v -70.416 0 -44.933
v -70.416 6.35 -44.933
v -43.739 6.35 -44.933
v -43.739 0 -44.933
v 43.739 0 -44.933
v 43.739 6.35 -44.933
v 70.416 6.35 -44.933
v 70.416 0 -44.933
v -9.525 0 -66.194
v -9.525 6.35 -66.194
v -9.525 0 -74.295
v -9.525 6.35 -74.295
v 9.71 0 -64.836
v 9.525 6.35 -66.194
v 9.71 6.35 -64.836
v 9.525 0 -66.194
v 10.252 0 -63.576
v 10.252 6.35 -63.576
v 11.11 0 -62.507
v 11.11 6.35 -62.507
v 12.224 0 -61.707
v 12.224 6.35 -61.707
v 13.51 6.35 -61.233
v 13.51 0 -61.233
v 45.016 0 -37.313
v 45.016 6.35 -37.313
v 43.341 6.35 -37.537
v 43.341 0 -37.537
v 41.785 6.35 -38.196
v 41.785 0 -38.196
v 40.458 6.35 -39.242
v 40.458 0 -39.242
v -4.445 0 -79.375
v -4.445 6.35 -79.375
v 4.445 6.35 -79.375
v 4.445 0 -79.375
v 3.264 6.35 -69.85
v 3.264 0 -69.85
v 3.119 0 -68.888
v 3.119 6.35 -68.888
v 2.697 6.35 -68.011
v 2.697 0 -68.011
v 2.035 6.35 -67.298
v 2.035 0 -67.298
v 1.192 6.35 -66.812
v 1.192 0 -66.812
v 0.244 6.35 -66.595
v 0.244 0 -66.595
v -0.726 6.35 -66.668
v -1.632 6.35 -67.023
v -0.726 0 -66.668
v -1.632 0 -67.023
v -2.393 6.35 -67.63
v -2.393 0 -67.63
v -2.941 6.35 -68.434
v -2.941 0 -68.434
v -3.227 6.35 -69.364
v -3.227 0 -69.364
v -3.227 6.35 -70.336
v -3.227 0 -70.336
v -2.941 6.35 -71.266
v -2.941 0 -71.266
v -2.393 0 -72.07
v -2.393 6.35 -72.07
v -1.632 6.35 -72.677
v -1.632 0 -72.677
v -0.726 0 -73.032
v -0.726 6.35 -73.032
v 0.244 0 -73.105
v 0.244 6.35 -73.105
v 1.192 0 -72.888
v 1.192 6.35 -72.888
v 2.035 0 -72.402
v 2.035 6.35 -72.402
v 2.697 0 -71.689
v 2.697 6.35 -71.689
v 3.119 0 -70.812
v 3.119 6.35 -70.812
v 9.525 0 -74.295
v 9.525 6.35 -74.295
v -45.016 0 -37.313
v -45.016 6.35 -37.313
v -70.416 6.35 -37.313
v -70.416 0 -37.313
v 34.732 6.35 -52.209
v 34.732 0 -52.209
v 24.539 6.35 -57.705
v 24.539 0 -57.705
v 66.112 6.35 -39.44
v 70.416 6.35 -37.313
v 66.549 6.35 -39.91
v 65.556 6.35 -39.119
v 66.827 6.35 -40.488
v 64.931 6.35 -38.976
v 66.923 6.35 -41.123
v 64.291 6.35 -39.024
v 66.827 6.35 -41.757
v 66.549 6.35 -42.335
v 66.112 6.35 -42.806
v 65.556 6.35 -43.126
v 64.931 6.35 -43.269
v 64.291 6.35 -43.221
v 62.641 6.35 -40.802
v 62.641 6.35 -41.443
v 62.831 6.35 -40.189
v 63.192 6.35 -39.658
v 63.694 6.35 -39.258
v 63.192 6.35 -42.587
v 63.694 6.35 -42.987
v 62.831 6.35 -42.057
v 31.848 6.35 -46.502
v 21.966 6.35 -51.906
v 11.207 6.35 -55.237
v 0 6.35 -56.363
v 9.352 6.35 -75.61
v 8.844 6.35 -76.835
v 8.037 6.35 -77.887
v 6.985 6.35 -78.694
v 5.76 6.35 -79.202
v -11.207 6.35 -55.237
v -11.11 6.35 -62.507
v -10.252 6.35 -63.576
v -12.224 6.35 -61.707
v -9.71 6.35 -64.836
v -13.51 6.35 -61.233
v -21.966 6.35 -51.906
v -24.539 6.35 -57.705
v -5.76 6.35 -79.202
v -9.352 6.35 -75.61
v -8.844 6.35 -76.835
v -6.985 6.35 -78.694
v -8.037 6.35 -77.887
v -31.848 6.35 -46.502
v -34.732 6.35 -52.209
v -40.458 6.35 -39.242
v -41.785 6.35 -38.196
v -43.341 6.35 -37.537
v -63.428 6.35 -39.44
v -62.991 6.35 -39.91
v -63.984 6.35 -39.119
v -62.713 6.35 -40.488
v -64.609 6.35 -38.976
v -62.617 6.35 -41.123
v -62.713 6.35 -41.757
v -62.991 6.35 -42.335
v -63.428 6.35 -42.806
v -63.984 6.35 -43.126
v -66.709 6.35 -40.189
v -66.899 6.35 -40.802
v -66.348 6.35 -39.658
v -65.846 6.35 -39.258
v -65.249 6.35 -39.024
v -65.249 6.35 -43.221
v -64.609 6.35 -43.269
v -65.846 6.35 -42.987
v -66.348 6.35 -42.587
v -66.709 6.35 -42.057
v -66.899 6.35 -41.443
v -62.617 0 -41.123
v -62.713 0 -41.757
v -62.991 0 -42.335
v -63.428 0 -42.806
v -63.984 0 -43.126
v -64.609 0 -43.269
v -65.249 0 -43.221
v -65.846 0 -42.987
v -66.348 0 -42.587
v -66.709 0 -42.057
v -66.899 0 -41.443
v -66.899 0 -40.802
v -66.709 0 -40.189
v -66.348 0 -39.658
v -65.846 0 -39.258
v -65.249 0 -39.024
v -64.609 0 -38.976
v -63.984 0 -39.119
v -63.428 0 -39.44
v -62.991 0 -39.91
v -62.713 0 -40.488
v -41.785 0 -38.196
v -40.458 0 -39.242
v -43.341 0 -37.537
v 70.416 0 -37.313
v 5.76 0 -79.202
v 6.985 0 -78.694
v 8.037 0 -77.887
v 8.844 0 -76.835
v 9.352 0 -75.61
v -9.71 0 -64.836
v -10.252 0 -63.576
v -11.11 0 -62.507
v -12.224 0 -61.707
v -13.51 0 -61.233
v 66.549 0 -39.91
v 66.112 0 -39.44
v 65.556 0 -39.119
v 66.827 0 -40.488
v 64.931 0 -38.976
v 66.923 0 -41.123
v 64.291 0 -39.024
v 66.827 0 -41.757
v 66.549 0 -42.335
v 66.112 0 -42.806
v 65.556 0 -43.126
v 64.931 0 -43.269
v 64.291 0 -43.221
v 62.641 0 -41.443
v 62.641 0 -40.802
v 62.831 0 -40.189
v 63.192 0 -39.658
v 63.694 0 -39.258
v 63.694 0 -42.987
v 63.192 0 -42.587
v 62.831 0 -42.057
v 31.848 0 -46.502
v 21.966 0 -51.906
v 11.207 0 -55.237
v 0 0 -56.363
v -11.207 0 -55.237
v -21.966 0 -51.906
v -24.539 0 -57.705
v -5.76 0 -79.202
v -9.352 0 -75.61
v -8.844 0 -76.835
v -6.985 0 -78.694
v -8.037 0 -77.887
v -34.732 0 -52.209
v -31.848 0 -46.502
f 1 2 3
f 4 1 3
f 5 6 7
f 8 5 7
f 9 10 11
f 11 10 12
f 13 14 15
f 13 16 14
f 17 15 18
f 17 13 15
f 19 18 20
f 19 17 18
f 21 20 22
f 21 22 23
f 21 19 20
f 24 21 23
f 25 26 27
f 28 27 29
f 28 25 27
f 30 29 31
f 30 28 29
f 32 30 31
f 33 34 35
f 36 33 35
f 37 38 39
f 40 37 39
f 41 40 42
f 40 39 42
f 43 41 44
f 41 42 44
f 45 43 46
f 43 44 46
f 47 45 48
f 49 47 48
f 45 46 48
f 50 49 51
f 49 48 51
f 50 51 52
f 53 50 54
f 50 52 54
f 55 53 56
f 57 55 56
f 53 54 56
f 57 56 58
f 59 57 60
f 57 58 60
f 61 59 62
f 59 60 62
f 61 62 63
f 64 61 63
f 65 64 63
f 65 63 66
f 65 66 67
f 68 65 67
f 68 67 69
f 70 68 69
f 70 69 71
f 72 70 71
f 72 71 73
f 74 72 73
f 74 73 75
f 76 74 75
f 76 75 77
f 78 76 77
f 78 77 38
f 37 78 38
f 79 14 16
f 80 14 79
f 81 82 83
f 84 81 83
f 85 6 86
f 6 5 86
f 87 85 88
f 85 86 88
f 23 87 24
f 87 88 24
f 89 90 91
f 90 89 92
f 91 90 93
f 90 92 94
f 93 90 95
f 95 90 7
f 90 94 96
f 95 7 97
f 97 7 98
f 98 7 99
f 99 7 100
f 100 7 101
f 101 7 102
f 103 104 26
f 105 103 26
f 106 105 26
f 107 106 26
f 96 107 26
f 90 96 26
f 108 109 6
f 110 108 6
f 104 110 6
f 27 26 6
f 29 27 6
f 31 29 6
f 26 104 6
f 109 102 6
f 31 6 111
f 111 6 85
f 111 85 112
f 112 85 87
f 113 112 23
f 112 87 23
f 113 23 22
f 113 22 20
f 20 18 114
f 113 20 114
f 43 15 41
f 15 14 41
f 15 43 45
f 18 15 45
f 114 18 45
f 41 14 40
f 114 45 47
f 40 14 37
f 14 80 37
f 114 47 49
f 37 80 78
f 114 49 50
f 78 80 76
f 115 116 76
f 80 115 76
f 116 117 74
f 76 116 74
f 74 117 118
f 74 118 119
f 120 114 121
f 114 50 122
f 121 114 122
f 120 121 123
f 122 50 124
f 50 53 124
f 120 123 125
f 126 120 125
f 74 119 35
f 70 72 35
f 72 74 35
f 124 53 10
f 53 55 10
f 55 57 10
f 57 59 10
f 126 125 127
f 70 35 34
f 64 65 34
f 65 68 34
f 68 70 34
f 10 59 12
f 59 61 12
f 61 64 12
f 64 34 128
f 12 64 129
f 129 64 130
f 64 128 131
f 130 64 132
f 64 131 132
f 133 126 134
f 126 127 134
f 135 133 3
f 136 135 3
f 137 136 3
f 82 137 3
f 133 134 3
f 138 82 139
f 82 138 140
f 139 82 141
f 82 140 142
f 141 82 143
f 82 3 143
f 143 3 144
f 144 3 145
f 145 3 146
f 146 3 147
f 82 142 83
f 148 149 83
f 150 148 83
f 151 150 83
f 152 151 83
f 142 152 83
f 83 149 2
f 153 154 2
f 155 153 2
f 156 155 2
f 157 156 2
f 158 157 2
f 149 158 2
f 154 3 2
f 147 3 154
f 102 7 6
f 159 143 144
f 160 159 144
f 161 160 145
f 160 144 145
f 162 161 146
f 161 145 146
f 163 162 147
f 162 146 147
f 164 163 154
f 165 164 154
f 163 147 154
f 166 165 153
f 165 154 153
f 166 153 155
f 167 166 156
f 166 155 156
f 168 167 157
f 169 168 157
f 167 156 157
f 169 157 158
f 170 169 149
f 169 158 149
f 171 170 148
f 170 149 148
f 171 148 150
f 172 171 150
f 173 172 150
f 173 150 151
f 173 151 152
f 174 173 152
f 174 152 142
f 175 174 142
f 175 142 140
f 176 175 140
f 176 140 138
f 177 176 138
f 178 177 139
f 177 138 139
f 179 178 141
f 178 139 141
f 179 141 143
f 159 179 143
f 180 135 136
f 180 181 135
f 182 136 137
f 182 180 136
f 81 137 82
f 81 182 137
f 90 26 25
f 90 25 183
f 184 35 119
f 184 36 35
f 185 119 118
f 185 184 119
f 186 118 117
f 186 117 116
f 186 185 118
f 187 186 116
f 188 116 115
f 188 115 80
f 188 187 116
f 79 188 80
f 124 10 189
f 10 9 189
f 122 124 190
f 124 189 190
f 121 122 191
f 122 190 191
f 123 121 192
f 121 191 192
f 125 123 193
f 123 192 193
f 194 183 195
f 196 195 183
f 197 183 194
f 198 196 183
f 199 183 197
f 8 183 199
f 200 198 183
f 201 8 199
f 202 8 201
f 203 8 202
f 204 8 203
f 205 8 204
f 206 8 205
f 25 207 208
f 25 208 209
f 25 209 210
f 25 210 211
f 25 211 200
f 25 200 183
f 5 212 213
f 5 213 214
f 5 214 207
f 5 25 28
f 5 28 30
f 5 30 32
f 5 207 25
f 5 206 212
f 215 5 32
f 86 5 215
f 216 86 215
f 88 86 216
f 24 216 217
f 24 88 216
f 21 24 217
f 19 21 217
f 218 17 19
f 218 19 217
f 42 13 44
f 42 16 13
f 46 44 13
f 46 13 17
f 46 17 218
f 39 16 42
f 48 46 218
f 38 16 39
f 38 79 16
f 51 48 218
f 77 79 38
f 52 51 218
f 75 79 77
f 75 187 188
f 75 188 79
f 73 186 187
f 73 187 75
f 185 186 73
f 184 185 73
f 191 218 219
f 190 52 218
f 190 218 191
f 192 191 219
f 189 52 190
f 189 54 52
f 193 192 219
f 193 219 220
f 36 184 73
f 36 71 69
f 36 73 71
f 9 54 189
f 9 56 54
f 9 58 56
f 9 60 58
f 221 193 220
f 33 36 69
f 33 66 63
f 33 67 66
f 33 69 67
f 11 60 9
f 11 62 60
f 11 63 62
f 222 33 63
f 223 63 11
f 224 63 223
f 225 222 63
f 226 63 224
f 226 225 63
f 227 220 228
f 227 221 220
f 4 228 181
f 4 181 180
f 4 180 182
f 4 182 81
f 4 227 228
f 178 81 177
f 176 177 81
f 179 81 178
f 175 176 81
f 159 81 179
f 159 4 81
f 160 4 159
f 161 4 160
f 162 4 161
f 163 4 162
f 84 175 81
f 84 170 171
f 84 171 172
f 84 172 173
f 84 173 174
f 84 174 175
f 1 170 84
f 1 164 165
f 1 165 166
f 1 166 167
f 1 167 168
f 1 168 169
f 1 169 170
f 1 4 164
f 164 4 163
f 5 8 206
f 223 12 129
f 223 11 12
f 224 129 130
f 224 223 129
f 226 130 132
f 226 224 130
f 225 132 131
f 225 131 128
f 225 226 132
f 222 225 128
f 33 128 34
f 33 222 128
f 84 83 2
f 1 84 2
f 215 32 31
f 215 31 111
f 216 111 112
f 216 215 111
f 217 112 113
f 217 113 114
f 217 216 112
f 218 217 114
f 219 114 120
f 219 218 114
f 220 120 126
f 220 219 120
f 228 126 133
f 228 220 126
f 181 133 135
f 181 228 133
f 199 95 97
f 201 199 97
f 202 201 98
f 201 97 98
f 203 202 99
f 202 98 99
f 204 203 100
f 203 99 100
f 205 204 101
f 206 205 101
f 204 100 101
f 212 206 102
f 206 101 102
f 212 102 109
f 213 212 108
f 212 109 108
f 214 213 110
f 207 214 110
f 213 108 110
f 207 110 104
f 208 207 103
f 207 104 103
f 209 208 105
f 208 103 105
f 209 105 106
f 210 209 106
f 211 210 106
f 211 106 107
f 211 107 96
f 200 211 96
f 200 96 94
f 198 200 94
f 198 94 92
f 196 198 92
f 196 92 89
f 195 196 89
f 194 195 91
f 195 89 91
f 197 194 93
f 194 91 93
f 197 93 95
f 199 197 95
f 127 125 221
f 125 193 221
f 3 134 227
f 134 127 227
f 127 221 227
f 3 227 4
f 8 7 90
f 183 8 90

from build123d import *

# Parameters (mm, degrees)
SKETCH1_R           = 62.70625
SKETCH1_R_2         = 56.3626
BOSS_EXTRUDE1_DEPTH = 6.35
SKETCH5_W           = 19.05
SKETCH5_H           = 18.832271031
BOSS_EXTRUDE2_DEPTH = 6.35
FILLET1_R           = 5.08
SKETCH11_R          = 3.2639
CUT_EXTRUDE2_DEPTH  = 7.35
SKETCH17_W          = 169.784888888
SKETCH17_H          = 116.987853086
CUT_EXTRUDE3_DEPTH  = 7.35
FILLET2_R           = 6.35
SKETCH18_R          = 2.15265
BOSS_EXTRUDE4_DEPTH = 6.35


with BuildPart() as part:
    # Sketch1 → Boss-Extrude1 (new body)
    with BuildSketch(Plane(origin=(0, 0, 0), x_dir=(1, 0, 0), z_dir=(0, 1, 0))):
        Circle(SKETCH1_R)
        Circle(SKETCH1_R_2, mode=Mode.SUBTRACT)
    extrude(amount=BOSS_EXTRUDE1_DEPTH)

    # Sketch5 → Boss-Extrude2 (add)
    with BuildSketch(Plane(origin=(0, 6.35, 0), x_dir=(1, 0, 0), z_dir=(0, 1, 0))):
        with Locations((0, 69.958864484)):
            Rectangle(SKETCH5_W, SKETCH5_H)
    extrude(amount=-BOSS_EXTRUDE2_DEPTH)

    # Fillet1
    fillet1_edges = [part.edges().sort_by_distance(p)[0] for p in [
        (9.525, 3.175, -61.978610537),
        (-9.525, 3.175, -61.978610537),
        (9.525, 3.175, -79.375),
        (-9.525, 3.175, -79.375),
    ]]
    fillet(fillet1_edges, radius=FILLET1_R)

    # Sketch11 → Cut-Extrude2 (cut, through all)
    with BuildSketch(Plane.XZ):
        with Locations((0, -69.85)):
            Circle(SKETCH11_R)
    extrude(amount=-CUT_EXTRUDE2_DEPTH, mode=Mode.SUBTRACT)

    # Sketch17 → Cut-Extrude3 (cut, through all)
    with BuildSketch(Plane(origin=(0, 6.35, 0), x_dir=(1, 0, 0), z_dir=(0, 1, 0))):
        with Locations((0, -21.181326543)):
            Rectangle(SKETCH17_W, SKETCH17_H)
    extrude(amount=-CUT_EXTRUDE3_DEPTH, mode=Mode.SUBTRACT)

    # Fillet2
    fillet2_edges = [part.edges().sort_by_distance(p)[0] for p in [
        (-42.243491333, 3.175, -37.3126),
        (42.243491333, 3.175, -37.3126),
    ]]
    fillet(fillet2_edges, radius=FILLET2_R)

    # Sketch18 → Boss-Extrude4 (add)
    with BuildSketch(Plane(origin=(0, 6.35, 0), x_dir=(1, 0, 0), z_dir=(0, 1, 0))):
        Polygon((-50.396861711, 37.3126), (-70.416081127, 37.3126), (-70.416081127, 44.9326), (-43.739401531, 44.9326), align=None)
        with Locations((-64.77, 41.1226)):
            Circle(SKETCH18_R, mode=Mode.SUBTRACT)
        Polygon((50.396861711, 37.3126), (43.739401531, 44.9326), (70.416081127, 44.9326), (70.416081127, 37.3126), align=None)
        with Locations((64.77, 41.1226)):
            Circle(SKETCH18_R, mode=Mode.SUBTRACT)
    extrude(amount=-BOSS_EXTRUDE4_DEPTH)


solid = part.part
